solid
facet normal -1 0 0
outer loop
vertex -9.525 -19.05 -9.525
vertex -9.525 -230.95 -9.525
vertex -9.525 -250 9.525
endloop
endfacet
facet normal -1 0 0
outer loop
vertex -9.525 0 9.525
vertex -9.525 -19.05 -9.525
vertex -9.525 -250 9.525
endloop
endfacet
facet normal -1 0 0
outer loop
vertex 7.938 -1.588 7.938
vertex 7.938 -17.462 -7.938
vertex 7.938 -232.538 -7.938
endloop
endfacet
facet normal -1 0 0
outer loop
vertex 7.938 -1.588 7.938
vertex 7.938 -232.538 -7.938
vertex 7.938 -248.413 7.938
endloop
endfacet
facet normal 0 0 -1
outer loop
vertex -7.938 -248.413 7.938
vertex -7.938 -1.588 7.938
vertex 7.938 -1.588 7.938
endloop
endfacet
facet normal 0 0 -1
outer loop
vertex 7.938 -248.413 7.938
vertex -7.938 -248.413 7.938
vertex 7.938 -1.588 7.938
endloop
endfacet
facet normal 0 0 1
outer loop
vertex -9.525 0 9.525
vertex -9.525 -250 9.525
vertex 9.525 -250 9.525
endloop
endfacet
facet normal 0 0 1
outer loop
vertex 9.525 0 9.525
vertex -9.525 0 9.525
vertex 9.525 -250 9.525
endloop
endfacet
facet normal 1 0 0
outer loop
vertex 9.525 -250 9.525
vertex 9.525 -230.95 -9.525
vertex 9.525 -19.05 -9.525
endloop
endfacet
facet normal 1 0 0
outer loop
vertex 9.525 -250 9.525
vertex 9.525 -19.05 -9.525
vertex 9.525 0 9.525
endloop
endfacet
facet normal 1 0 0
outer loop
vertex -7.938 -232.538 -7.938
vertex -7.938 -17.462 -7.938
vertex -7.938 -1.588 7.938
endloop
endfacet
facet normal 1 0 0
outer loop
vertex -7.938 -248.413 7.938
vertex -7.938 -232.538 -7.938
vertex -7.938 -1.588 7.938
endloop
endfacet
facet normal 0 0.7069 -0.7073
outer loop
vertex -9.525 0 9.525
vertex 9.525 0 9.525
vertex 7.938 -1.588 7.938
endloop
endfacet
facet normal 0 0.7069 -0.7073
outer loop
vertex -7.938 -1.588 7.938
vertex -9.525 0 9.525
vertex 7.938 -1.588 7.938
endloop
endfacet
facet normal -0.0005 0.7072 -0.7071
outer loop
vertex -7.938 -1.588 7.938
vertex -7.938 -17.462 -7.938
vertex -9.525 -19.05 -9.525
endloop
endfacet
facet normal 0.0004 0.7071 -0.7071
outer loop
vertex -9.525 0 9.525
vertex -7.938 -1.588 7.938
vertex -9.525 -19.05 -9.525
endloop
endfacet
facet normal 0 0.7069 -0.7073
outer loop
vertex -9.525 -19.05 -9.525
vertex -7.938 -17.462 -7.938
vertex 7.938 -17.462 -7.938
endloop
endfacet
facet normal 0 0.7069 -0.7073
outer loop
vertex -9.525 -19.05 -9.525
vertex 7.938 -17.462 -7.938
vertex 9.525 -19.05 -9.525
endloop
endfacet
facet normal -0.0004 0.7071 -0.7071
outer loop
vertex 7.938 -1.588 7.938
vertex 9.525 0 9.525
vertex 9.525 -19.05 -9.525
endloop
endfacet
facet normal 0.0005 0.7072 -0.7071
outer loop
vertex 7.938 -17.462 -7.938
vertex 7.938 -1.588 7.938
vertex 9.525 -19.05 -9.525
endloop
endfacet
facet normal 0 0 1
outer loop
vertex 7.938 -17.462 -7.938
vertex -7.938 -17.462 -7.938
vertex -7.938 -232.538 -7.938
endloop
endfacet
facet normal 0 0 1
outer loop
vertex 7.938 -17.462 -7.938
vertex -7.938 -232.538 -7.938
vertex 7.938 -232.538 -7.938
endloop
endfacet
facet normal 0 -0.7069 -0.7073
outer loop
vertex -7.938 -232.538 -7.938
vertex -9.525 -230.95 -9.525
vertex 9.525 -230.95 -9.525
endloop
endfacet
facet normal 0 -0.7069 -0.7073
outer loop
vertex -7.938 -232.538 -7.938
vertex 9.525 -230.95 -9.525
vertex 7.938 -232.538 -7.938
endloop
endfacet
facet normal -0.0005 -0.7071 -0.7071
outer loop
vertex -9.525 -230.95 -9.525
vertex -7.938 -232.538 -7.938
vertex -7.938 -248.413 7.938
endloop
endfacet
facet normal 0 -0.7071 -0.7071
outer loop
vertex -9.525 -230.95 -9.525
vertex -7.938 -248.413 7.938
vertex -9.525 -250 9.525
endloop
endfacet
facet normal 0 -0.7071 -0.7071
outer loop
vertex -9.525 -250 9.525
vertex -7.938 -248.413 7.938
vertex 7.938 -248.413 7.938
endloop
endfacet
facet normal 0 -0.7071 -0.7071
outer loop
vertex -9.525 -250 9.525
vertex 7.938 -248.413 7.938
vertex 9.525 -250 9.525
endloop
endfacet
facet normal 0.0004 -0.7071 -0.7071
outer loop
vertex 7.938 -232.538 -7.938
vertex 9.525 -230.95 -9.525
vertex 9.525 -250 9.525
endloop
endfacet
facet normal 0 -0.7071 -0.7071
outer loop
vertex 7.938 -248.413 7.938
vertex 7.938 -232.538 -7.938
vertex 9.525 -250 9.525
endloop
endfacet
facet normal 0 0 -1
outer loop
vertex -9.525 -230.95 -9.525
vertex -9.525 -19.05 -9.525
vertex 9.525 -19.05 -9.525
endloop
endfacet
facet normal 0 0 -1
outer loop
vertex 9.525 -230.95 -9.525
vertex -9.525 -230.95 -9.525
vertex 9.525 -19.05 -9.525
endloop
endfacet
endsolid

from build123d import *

# Parameters (mm, degrees)
F0_W     = 19.05
F0_H     = 19.05
F0_W_2   = 15.875
F0_H_2   = 15.875
F1_DEPTH = 250
F3_DEPTH = 9.526
F4_DEPTH = 9.526


with BuildPart() as f1:
    # F0 (on Front) → F1 (new body)
    with BuildSketch(Plane.XZ):
        Rectangle(F0_W, F0_H)
        Rectangle(F0_W_2, F0_H_2, mode=Mode.SUBTRACT)
    extrude(amount=F1_DEPTH)

    # F2 (on Right) → F3 (cut, through all)
    with BuildSketch(Plane.YZ):
        Polygon((0, -9.525), (0, 9.525), (-19.05, -9.525), align=None)
        Polygon((-250, 9.525), (-250, -9.525), (-230.95, -9.525), align=None)
    extrude(amount=-F3_DEPTH, mode=Mode.SUBTRACT)

    # F2 (on Right) → F4 (cut, through all)
    with BuildSketch(Plane.YZ):
        Polygon((0, -9.525), (0, 9.525), (-19.05, -9.525), align=None)
        Polygon((-250, 9.525), (-250, -9.525), (-230.95, -9.525), align=None)
    extrude(amount=F4_DEPTH, mode=Mode.SUBTRACT)


solid = f1.part
